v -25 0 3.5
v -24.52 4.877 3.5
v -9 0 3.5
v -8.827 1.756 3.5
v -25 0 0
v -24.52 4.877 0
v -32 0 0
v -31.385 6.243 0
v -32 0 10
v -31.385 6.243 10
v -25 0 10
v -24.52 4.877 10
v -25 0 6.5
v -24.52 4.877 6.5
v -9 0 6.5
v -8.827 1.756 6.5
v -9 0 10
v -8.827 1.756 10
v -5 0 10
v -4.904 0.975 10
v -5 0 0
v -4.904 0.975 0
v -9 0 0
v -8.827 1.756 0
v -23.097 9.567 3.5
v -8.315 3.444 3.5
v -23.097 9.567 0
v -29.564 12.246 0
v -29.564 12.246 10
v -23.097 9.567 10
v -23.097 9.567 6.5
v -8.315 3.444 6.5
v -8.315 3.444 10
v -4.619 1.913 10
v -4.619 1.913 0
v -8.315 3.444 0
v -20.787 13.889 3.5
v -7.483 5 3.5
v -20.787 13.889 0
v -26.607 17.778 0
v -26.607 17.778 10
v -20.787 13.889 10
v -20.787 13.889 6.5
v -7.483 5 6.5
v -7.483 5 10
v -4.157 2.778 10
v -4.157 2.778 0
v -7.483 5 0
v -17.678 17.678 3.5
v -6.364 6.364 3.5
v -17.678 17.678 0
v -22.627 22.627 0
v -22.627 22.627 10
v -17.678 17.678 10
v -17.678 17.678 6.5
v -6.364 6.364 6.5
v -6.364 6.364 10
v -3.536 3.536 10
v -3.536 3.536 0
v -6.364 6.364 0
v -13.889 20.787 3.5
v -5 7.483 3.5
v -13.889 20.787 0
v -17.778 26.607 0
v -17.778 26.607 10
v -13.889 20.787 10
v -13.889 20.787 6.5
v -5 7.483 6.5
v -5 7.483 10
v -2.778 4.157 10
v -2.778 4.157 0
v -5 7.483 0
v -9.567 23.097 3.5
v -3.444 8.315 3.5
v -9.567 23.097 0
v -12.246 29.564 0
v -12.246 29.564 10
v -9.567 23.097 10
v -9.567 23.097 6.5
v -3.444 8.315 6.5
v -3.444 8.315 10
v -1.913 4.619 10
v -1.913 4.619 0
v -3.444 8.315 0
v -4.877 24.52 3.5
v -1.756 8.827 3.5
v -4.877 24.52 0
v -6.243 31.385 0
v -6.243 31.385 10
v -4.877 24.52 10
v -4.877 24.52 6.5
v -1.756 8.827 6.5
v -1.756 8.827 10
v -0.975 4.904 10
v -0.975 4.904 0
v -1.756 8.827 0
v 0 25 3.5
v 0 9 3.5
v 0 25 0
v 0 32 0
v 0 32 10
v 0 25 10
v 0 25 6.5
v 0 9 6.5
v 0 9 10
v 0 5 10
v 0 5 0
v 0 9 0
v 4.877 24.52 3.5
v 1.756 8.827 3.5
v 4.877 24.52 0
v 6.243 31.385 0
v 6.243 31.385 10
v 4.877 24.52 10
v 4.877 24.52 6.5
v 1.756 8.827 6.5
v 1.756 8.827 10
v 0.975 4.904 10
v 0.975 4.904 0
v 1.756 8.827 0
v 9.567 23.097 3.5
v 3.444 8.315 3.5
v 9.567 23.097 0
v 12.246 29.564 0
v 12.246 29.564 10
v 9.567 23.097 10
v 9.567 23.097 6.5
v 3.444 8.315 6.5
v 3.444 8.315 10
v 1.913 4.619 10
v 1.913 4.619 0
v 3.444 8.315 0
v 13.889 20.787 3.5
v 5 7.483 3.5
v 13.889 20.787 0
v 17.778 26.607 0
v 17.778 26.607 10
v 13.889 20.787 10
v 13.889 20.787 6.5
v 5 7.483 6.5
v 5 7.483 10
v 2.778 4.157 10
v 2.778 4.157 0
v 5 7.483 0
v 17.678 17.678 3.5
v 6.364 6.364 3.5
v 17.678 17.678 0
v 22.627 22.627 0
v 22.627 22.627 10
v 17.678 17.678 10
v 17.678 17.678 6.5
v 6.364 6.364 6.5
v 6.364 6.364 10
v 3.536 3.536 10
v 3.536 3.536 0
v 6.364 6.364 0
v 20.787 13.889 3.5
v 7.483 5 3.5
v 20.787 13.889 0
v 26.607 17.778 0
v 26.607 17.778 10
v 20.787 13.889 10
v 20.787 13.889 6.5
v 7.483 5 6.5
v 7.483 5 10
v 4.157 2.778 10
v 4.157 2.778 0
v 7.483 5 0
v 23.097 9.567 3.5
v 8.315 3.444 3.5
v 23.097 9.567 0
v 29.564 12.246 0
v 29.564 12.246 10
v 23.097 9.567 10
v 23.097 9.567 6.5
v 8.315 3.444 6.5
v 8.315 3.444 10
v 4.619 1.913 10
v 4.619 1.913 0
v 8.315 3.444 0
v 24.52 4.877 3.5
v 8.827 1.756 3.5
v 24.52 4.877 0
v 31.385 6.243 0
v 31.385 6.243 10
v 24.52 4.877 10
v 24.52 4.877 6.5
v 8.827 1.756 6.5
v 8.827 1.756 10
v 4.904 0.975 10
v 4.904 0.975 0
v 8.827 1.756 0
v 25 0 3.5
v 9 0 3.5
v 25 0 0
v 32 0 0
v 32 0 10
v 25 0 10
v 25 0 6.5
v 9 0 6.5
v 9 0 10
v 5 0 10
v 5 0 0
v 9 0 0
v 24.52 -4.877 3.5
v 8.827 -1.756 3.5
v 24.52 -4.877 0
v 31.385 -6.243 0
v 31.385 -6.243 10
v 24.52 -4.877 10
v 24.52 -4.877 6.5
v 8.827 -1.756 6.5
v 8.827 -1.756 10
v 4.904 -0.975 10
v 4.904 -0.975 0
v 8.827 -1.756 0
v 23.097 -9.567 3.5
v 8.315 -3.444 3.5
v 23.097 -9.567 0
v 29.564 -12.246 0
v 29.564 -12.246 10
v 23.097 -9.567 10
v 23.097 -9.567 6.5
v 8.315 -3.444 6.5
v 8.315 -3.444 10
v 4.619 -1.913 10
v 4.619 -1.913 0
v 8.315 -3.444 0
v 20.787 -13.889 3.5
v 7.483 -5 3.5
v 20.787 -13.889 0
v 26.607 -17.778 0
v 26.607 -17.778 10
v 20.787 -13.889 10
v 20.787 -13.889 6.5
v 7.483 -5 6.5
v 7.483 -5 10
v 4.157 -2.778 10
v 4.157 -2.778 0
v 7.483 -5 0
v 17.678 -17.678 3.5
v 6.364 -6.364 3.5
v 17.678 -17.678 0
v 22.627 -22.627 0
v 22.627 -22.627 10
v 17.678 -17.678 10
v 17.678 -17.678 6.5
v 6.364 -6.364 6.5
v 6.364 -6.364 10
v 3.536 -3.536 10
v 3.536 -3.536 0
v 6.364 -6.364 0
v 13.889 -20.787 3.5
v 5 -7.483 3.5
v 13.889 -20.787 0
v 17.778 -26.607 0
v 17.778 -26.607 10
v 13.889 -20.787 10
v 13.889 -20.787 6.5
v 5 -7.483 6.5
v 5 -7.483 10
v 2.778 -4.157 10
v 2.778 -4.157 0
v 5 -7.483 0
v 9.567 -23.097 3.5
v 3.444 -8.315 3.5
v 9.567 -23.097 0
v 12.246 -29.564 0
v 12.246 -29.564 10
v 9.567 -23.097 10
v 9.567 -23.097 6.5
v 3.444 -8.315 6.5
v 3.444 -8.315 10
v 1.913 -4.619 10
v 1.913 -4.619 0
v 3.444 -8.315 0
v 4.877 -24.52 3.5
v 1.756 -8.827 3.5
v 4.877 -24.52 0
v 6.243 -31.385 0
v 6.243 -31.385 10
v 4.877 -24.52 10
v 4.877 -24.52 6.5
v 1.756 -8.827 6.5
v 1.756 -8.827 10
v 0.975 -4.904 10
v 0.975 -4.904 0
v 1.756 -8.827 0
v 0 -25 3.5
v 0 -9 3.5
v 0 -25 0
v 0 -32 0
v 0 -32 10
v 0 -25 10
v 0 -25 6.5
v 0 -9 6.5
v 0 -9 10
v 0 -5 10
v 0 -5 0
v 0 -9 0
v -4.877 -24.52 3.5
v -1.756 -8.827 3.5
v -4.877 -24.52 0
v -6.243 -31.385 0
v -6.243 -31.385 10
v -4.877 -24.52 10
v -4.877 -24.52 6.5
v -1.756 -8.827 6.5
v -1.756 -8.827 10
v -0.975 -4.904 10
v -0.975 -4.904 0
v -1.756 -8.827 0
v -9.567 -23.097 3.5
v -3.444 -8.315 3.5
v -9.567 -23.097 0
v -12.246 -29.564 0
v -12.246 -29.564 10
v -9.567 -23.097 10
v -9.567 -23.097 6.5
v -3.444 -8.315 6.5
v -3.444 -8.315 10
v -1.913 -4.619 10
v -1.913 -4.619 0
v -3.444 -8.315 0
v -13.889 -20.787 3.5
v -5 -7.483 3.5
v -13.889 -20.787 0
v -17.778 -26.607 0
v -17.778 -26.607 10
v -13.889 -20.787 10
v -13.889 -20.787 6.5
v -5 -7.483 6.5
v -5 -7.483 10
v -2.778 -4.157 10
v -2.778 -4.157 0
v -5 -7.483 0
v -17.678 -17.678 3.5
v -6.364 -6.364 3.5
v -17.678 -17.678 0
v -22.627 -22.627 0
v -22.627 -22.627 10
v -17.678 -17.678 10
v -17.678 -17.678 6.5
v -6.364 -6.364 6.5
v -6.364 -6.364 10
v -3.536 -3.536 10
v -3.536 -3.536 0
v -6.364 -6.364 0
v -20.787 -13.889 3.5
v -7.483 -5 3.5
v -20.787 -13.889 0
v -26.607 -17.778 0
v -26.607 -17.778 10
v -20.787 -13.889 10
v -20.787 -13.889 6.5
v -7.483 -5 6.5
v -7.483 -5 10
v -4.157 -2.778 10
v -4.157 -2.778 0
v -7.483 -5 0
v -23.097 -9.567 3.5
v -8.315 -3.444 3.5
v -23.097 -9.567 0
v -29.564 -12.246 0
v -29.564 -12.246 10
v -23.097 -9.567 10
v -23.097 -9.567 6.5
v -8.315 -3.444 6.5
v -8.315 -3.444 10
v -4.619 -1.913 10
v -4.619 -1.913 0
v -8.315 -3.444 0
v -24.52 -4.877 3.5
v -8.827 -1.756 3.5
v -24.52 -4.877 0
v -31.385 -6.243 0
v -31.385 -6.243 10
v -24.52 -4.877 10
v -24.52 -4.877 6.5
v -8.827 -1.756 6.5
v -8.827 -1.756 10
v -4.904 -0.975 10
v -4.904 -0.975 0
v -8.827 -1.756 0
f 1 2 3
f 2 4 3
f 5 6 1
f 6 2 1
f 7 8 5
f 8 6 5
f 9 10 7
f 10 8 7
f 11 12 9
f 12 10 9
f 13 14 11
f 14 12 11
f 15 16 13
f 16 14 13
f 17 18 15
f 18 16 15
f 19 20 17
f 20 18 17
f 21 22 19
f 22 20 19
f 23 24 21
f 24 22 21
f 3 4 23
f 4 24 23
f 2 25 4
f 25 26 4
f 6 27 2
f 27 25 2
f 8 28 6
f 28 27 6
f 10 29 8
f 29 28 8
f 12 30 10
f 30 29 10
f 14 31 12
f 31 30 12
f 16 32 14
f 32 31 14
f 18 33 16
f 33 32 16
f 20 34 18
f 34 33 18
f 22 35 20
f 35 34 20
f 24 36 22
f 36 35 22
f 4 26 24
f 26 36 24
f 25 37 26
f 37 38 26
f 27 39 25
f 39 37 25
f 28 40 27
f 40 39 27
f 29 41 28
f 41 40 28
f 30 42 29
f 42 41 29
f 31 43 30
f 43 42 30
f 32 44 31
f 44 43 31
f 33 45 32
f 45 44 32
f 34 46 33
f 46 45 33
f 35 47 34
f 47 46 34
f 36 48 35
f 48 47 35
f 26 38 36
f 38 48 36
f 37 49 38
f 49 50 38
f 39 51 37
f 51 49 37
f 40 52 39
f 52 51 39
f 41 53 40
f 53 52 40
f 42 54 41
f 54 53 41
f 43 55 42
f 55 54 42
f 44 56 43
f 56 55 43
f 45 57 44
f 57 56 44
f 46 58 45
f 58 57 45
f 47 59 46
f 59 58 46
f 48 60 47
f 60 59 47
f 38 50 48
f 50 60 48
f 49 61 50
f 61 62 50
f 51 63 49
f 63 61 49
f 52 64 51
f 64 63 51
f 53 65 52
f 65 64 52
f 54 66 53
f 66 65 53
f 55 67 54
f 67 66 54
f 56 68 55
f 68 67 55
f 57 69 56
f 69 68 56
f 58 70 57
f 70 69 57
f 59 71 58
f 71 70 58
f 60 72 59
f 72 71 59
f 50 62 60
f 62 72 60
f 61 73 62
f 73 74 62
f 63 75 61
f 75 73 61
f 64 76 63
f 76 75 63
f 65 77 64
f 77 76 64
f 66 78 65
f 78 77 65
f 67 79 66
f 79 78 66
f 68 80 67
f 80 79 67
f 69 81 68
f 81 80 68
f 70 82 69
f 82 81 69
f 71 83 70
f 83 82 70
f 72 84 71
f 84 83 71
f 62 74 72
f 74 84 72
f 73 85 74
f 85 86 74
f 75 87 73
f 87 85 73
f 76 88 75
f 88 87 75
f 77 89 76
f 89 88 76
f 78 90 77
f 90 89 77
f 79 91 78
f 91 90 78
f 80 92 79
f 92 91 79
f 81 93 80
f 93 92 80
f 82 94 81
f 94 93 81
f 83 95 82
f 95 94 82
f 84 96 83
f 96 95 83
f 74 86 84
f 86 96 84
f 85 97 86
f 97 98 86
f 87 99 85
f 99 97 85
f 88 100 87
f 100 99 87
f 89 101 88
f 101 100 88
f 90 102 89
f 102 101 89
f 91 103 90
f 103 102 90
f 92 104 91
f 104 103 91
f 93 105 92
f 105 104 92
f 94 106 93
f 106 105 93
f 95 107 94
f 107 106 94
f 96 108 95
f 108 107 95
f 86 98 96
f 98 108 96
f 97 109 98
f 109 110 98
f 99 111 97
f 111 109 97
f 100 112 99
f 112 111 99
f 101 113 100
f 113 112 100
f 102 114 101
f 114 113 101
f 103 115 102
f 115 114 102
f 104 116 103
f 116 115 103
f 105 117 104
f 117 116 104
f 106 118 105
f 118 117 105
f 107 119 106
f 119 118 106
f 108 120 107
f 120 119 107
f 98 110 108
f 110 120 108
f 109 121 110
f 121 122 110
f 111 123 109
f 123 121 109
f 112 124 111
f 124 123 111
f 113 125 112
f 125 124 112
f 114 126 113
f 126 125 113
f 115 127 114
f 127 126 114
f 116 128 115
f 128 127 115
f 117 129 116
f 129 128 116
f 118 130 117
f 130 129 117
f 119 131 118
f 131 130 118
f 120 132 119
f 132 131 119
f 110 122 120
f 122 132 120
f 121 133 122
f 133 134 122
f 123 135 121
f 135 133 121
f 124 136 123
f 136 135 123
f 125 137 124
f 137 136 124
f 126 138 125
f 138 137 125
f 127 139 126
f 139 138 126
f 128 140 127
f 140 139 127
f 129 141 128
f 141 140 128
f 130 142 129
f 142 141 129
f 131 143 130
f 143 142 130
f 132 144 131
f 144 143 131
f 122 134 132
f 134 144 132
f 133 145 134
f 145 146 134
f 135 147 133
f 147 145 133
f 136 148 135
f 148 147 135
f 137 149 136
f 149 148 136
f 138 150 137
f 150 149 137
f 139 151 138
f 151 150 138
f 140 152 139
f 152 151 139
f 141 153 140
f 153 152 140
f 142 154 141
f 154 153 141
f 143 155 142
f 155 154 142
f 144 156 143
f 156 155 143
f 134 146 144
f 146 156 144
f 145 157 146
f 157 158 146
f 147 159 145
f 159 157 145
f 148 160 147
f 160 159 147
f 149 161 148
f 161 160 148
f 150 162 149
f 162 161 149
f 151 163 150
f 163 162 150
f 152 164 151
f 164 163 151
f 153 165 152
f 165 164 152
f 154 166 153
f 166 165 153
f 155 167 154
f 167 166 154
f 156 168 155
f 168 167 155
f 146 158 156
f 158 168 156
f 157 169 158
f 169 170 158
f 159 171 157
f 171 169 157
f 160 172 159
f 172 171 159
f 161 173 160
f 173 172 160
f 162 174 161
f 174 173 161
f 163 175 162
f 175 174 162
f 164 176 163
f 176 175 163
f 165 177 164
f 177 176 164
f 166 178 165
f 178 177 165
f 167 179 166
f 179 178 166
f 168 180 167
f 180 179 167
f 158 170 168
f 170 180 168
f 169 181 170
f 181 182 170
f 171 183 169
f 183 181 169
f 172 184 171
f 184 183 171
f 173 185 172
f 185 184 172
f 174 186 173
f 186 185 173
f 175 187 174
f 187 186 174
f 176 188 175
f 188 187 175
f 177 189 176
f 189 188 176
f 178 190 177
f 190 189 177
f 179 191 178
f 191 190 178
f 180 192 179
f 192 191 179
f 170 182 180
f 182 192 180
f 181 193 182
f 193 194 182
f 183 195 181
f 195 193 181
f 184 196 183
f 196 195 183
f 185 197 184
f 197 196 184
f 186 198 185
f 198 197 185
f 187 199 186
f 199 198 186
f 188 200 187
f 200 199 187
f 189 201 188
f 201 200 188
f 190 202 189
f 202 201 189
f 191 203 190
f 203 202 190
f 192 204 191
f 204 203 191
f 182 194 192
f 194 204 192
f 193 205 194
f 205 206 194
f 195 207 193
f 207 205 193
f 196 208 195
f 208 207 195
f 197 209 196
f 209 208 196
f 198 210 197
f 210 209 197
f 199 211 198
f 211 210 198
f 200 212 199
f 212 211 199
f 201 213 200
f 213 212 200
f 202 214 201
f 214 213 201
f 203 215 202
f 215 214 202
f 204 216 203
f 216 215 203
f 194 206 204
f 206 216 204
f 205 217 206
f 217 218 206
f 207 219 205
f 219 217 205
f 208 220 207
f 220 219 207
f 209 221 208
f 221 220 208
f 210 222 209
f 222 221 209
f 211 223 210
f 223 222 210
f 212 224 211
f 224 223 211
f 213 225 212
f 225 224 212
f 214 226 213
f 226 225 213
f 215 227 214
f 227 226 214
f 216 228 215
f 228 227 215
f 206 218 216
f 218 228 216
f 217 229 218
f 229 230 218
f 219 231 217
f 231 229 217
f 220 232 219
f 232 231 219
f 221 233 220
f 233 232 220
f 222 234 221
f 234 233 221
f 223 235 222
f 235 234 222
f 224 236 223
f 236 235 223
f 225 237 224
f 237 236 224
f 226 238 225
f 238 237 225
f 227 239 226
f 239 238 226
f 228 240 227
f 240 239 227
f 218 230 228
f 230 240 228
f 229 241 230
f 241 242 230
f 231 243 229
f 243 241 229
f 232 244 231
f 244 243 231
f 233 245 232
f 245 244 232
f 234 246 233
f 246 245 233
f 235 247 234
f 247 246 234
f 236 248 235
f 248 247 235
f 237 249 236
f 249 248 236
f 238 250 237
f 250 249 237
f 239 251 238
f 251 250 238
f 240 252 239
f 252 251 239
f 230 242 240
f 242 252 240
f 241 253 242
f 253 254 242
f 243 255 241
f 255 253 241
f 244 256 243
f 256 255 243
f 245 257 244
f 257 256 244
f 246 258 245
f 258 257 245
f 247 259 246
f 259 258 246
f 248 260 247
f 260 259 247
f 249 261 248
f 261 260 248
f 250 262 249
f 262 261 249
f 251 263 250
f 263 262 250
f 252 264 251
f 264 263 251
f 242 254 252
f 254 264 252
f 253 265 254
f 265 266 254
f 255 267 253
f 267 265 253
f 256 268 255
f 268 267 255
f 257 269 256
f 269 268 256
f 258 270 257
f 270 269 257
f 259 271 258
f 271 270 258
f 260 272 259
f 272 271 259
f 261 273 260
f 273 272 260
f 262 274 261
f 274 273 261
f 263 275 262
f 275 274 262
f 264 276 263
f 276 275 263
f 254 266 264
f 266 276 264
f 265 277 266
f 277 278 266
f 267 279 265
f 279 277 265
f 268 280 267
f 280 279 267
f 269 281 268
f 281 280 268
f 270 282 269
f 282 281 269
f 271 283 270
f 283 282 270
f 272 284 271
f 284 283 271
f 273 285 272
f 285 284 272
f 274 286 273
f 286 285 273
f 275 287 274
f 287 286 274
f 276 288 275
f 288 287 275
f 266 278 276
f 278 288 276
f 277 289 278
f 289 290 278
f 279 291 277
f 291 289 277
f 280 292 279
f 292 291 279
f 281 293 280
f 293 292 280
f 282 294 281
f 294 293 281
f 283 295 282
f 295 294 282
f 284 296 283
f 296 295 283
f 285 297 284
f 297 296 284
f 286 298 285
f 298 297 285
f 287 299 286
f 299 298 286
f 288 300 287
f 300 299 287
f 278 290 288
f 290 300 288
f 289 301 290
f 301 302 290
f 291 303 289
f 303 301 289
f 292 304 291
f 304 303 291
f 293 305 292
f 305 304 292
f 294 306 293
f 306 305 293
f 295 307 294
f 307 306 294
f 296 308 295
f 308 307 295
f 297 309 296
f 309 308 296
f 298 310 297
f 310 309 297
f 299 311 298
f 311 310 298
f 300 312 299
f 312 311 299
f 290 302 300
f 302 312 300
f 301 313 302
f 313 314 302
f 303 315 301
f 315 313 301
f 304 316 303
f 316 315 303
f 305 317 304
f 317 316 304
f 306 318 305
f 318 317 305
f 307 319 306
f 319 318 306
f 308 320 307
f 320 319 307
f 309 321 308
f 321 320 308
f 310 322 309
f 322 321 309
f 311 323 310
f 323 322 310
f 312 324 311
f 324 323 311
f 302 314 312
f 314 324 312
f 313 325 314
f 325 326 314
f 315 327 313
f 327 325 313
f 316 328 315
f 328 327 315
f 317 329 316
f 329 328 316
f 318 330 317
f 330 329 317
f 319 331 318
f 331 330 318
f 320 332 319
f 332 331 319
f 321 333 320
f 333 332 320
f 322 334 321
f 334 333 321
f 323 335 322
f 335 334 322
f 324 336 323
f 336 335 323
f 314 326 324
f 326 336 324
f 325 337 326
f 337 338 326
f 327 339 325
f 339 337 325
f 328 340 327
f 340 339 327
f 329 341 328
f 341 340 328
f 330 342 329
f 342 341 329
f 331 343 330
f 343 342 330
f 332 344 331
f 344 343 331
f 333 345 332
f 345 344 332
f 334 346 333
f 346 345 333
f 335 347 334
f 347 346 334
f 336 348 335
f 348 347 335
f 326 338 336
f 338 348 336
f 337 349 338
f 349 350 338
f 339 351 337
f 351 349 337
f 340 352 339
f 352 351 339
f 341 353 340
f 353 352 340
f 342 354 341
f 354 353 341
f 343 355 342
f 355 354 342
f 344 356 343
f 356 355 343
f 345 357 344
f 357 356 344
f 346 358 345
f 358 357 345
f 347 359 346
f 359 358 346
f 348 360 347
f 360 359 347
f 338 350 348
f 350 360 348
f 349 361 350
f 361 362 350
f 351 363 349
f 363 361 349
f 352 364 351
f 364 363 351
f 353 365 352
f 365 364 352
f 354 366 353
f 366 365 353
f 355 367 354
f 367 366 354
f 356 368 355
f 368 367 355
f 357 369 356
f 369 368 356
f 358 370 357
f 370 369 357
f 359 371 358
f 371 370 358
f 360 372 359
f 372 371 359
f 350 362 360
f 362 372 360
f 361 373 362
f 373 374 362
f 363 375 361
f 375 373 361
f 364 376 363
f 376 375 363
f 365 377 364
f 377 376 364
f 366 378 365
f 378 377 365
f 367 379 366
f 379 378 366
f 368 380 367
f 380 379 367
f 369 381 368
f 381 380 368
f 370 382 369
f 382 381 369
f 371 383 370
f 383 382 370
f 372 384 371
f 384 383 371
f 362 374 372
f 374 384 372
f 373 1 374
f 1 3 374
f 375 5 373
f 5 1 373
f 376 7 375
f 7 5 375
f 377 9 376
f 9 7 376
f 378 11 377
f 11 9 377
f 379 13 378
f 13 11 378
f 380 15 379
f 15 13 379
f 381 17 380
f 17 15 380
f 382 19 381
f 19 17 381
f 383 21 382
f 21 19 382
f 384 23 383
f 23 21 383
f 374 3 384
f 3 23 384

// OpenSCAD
$fn = 32;

// ----------------------------------------------------------------------
// Revolved part: handwheel R32
// ----------------------------------------------------------------------

// --- parameters (mm) ---
bore_r = 5;               // bore radius
rim_r = 32;               // rim radius
rim_w = 7;                // rim axial width
rim_t = 10;               // rim diameter height
hub_r = 9;                // hub radius
web_t = 3;                // web thickness
revolve_angle = 360;      // revolve sweep, degrees

bore_d = 2 * bore_r;
rim_d = 2 * rim_r;
hub_d = 2 * hub_r;

profile = [[5, 0], [9, 0], [9, 3.5], [25, 3.5], [25, 0], [32, 0], [32, 10], [25, 10], [25, 6.5], [9, 6.5], [9, 10], [5, 10]];  // primary outline, 12 points, counter clockwise

// --- the one profile operation ---
rotate_extrude(angle = revolve_angle) polygon(points = profile);
